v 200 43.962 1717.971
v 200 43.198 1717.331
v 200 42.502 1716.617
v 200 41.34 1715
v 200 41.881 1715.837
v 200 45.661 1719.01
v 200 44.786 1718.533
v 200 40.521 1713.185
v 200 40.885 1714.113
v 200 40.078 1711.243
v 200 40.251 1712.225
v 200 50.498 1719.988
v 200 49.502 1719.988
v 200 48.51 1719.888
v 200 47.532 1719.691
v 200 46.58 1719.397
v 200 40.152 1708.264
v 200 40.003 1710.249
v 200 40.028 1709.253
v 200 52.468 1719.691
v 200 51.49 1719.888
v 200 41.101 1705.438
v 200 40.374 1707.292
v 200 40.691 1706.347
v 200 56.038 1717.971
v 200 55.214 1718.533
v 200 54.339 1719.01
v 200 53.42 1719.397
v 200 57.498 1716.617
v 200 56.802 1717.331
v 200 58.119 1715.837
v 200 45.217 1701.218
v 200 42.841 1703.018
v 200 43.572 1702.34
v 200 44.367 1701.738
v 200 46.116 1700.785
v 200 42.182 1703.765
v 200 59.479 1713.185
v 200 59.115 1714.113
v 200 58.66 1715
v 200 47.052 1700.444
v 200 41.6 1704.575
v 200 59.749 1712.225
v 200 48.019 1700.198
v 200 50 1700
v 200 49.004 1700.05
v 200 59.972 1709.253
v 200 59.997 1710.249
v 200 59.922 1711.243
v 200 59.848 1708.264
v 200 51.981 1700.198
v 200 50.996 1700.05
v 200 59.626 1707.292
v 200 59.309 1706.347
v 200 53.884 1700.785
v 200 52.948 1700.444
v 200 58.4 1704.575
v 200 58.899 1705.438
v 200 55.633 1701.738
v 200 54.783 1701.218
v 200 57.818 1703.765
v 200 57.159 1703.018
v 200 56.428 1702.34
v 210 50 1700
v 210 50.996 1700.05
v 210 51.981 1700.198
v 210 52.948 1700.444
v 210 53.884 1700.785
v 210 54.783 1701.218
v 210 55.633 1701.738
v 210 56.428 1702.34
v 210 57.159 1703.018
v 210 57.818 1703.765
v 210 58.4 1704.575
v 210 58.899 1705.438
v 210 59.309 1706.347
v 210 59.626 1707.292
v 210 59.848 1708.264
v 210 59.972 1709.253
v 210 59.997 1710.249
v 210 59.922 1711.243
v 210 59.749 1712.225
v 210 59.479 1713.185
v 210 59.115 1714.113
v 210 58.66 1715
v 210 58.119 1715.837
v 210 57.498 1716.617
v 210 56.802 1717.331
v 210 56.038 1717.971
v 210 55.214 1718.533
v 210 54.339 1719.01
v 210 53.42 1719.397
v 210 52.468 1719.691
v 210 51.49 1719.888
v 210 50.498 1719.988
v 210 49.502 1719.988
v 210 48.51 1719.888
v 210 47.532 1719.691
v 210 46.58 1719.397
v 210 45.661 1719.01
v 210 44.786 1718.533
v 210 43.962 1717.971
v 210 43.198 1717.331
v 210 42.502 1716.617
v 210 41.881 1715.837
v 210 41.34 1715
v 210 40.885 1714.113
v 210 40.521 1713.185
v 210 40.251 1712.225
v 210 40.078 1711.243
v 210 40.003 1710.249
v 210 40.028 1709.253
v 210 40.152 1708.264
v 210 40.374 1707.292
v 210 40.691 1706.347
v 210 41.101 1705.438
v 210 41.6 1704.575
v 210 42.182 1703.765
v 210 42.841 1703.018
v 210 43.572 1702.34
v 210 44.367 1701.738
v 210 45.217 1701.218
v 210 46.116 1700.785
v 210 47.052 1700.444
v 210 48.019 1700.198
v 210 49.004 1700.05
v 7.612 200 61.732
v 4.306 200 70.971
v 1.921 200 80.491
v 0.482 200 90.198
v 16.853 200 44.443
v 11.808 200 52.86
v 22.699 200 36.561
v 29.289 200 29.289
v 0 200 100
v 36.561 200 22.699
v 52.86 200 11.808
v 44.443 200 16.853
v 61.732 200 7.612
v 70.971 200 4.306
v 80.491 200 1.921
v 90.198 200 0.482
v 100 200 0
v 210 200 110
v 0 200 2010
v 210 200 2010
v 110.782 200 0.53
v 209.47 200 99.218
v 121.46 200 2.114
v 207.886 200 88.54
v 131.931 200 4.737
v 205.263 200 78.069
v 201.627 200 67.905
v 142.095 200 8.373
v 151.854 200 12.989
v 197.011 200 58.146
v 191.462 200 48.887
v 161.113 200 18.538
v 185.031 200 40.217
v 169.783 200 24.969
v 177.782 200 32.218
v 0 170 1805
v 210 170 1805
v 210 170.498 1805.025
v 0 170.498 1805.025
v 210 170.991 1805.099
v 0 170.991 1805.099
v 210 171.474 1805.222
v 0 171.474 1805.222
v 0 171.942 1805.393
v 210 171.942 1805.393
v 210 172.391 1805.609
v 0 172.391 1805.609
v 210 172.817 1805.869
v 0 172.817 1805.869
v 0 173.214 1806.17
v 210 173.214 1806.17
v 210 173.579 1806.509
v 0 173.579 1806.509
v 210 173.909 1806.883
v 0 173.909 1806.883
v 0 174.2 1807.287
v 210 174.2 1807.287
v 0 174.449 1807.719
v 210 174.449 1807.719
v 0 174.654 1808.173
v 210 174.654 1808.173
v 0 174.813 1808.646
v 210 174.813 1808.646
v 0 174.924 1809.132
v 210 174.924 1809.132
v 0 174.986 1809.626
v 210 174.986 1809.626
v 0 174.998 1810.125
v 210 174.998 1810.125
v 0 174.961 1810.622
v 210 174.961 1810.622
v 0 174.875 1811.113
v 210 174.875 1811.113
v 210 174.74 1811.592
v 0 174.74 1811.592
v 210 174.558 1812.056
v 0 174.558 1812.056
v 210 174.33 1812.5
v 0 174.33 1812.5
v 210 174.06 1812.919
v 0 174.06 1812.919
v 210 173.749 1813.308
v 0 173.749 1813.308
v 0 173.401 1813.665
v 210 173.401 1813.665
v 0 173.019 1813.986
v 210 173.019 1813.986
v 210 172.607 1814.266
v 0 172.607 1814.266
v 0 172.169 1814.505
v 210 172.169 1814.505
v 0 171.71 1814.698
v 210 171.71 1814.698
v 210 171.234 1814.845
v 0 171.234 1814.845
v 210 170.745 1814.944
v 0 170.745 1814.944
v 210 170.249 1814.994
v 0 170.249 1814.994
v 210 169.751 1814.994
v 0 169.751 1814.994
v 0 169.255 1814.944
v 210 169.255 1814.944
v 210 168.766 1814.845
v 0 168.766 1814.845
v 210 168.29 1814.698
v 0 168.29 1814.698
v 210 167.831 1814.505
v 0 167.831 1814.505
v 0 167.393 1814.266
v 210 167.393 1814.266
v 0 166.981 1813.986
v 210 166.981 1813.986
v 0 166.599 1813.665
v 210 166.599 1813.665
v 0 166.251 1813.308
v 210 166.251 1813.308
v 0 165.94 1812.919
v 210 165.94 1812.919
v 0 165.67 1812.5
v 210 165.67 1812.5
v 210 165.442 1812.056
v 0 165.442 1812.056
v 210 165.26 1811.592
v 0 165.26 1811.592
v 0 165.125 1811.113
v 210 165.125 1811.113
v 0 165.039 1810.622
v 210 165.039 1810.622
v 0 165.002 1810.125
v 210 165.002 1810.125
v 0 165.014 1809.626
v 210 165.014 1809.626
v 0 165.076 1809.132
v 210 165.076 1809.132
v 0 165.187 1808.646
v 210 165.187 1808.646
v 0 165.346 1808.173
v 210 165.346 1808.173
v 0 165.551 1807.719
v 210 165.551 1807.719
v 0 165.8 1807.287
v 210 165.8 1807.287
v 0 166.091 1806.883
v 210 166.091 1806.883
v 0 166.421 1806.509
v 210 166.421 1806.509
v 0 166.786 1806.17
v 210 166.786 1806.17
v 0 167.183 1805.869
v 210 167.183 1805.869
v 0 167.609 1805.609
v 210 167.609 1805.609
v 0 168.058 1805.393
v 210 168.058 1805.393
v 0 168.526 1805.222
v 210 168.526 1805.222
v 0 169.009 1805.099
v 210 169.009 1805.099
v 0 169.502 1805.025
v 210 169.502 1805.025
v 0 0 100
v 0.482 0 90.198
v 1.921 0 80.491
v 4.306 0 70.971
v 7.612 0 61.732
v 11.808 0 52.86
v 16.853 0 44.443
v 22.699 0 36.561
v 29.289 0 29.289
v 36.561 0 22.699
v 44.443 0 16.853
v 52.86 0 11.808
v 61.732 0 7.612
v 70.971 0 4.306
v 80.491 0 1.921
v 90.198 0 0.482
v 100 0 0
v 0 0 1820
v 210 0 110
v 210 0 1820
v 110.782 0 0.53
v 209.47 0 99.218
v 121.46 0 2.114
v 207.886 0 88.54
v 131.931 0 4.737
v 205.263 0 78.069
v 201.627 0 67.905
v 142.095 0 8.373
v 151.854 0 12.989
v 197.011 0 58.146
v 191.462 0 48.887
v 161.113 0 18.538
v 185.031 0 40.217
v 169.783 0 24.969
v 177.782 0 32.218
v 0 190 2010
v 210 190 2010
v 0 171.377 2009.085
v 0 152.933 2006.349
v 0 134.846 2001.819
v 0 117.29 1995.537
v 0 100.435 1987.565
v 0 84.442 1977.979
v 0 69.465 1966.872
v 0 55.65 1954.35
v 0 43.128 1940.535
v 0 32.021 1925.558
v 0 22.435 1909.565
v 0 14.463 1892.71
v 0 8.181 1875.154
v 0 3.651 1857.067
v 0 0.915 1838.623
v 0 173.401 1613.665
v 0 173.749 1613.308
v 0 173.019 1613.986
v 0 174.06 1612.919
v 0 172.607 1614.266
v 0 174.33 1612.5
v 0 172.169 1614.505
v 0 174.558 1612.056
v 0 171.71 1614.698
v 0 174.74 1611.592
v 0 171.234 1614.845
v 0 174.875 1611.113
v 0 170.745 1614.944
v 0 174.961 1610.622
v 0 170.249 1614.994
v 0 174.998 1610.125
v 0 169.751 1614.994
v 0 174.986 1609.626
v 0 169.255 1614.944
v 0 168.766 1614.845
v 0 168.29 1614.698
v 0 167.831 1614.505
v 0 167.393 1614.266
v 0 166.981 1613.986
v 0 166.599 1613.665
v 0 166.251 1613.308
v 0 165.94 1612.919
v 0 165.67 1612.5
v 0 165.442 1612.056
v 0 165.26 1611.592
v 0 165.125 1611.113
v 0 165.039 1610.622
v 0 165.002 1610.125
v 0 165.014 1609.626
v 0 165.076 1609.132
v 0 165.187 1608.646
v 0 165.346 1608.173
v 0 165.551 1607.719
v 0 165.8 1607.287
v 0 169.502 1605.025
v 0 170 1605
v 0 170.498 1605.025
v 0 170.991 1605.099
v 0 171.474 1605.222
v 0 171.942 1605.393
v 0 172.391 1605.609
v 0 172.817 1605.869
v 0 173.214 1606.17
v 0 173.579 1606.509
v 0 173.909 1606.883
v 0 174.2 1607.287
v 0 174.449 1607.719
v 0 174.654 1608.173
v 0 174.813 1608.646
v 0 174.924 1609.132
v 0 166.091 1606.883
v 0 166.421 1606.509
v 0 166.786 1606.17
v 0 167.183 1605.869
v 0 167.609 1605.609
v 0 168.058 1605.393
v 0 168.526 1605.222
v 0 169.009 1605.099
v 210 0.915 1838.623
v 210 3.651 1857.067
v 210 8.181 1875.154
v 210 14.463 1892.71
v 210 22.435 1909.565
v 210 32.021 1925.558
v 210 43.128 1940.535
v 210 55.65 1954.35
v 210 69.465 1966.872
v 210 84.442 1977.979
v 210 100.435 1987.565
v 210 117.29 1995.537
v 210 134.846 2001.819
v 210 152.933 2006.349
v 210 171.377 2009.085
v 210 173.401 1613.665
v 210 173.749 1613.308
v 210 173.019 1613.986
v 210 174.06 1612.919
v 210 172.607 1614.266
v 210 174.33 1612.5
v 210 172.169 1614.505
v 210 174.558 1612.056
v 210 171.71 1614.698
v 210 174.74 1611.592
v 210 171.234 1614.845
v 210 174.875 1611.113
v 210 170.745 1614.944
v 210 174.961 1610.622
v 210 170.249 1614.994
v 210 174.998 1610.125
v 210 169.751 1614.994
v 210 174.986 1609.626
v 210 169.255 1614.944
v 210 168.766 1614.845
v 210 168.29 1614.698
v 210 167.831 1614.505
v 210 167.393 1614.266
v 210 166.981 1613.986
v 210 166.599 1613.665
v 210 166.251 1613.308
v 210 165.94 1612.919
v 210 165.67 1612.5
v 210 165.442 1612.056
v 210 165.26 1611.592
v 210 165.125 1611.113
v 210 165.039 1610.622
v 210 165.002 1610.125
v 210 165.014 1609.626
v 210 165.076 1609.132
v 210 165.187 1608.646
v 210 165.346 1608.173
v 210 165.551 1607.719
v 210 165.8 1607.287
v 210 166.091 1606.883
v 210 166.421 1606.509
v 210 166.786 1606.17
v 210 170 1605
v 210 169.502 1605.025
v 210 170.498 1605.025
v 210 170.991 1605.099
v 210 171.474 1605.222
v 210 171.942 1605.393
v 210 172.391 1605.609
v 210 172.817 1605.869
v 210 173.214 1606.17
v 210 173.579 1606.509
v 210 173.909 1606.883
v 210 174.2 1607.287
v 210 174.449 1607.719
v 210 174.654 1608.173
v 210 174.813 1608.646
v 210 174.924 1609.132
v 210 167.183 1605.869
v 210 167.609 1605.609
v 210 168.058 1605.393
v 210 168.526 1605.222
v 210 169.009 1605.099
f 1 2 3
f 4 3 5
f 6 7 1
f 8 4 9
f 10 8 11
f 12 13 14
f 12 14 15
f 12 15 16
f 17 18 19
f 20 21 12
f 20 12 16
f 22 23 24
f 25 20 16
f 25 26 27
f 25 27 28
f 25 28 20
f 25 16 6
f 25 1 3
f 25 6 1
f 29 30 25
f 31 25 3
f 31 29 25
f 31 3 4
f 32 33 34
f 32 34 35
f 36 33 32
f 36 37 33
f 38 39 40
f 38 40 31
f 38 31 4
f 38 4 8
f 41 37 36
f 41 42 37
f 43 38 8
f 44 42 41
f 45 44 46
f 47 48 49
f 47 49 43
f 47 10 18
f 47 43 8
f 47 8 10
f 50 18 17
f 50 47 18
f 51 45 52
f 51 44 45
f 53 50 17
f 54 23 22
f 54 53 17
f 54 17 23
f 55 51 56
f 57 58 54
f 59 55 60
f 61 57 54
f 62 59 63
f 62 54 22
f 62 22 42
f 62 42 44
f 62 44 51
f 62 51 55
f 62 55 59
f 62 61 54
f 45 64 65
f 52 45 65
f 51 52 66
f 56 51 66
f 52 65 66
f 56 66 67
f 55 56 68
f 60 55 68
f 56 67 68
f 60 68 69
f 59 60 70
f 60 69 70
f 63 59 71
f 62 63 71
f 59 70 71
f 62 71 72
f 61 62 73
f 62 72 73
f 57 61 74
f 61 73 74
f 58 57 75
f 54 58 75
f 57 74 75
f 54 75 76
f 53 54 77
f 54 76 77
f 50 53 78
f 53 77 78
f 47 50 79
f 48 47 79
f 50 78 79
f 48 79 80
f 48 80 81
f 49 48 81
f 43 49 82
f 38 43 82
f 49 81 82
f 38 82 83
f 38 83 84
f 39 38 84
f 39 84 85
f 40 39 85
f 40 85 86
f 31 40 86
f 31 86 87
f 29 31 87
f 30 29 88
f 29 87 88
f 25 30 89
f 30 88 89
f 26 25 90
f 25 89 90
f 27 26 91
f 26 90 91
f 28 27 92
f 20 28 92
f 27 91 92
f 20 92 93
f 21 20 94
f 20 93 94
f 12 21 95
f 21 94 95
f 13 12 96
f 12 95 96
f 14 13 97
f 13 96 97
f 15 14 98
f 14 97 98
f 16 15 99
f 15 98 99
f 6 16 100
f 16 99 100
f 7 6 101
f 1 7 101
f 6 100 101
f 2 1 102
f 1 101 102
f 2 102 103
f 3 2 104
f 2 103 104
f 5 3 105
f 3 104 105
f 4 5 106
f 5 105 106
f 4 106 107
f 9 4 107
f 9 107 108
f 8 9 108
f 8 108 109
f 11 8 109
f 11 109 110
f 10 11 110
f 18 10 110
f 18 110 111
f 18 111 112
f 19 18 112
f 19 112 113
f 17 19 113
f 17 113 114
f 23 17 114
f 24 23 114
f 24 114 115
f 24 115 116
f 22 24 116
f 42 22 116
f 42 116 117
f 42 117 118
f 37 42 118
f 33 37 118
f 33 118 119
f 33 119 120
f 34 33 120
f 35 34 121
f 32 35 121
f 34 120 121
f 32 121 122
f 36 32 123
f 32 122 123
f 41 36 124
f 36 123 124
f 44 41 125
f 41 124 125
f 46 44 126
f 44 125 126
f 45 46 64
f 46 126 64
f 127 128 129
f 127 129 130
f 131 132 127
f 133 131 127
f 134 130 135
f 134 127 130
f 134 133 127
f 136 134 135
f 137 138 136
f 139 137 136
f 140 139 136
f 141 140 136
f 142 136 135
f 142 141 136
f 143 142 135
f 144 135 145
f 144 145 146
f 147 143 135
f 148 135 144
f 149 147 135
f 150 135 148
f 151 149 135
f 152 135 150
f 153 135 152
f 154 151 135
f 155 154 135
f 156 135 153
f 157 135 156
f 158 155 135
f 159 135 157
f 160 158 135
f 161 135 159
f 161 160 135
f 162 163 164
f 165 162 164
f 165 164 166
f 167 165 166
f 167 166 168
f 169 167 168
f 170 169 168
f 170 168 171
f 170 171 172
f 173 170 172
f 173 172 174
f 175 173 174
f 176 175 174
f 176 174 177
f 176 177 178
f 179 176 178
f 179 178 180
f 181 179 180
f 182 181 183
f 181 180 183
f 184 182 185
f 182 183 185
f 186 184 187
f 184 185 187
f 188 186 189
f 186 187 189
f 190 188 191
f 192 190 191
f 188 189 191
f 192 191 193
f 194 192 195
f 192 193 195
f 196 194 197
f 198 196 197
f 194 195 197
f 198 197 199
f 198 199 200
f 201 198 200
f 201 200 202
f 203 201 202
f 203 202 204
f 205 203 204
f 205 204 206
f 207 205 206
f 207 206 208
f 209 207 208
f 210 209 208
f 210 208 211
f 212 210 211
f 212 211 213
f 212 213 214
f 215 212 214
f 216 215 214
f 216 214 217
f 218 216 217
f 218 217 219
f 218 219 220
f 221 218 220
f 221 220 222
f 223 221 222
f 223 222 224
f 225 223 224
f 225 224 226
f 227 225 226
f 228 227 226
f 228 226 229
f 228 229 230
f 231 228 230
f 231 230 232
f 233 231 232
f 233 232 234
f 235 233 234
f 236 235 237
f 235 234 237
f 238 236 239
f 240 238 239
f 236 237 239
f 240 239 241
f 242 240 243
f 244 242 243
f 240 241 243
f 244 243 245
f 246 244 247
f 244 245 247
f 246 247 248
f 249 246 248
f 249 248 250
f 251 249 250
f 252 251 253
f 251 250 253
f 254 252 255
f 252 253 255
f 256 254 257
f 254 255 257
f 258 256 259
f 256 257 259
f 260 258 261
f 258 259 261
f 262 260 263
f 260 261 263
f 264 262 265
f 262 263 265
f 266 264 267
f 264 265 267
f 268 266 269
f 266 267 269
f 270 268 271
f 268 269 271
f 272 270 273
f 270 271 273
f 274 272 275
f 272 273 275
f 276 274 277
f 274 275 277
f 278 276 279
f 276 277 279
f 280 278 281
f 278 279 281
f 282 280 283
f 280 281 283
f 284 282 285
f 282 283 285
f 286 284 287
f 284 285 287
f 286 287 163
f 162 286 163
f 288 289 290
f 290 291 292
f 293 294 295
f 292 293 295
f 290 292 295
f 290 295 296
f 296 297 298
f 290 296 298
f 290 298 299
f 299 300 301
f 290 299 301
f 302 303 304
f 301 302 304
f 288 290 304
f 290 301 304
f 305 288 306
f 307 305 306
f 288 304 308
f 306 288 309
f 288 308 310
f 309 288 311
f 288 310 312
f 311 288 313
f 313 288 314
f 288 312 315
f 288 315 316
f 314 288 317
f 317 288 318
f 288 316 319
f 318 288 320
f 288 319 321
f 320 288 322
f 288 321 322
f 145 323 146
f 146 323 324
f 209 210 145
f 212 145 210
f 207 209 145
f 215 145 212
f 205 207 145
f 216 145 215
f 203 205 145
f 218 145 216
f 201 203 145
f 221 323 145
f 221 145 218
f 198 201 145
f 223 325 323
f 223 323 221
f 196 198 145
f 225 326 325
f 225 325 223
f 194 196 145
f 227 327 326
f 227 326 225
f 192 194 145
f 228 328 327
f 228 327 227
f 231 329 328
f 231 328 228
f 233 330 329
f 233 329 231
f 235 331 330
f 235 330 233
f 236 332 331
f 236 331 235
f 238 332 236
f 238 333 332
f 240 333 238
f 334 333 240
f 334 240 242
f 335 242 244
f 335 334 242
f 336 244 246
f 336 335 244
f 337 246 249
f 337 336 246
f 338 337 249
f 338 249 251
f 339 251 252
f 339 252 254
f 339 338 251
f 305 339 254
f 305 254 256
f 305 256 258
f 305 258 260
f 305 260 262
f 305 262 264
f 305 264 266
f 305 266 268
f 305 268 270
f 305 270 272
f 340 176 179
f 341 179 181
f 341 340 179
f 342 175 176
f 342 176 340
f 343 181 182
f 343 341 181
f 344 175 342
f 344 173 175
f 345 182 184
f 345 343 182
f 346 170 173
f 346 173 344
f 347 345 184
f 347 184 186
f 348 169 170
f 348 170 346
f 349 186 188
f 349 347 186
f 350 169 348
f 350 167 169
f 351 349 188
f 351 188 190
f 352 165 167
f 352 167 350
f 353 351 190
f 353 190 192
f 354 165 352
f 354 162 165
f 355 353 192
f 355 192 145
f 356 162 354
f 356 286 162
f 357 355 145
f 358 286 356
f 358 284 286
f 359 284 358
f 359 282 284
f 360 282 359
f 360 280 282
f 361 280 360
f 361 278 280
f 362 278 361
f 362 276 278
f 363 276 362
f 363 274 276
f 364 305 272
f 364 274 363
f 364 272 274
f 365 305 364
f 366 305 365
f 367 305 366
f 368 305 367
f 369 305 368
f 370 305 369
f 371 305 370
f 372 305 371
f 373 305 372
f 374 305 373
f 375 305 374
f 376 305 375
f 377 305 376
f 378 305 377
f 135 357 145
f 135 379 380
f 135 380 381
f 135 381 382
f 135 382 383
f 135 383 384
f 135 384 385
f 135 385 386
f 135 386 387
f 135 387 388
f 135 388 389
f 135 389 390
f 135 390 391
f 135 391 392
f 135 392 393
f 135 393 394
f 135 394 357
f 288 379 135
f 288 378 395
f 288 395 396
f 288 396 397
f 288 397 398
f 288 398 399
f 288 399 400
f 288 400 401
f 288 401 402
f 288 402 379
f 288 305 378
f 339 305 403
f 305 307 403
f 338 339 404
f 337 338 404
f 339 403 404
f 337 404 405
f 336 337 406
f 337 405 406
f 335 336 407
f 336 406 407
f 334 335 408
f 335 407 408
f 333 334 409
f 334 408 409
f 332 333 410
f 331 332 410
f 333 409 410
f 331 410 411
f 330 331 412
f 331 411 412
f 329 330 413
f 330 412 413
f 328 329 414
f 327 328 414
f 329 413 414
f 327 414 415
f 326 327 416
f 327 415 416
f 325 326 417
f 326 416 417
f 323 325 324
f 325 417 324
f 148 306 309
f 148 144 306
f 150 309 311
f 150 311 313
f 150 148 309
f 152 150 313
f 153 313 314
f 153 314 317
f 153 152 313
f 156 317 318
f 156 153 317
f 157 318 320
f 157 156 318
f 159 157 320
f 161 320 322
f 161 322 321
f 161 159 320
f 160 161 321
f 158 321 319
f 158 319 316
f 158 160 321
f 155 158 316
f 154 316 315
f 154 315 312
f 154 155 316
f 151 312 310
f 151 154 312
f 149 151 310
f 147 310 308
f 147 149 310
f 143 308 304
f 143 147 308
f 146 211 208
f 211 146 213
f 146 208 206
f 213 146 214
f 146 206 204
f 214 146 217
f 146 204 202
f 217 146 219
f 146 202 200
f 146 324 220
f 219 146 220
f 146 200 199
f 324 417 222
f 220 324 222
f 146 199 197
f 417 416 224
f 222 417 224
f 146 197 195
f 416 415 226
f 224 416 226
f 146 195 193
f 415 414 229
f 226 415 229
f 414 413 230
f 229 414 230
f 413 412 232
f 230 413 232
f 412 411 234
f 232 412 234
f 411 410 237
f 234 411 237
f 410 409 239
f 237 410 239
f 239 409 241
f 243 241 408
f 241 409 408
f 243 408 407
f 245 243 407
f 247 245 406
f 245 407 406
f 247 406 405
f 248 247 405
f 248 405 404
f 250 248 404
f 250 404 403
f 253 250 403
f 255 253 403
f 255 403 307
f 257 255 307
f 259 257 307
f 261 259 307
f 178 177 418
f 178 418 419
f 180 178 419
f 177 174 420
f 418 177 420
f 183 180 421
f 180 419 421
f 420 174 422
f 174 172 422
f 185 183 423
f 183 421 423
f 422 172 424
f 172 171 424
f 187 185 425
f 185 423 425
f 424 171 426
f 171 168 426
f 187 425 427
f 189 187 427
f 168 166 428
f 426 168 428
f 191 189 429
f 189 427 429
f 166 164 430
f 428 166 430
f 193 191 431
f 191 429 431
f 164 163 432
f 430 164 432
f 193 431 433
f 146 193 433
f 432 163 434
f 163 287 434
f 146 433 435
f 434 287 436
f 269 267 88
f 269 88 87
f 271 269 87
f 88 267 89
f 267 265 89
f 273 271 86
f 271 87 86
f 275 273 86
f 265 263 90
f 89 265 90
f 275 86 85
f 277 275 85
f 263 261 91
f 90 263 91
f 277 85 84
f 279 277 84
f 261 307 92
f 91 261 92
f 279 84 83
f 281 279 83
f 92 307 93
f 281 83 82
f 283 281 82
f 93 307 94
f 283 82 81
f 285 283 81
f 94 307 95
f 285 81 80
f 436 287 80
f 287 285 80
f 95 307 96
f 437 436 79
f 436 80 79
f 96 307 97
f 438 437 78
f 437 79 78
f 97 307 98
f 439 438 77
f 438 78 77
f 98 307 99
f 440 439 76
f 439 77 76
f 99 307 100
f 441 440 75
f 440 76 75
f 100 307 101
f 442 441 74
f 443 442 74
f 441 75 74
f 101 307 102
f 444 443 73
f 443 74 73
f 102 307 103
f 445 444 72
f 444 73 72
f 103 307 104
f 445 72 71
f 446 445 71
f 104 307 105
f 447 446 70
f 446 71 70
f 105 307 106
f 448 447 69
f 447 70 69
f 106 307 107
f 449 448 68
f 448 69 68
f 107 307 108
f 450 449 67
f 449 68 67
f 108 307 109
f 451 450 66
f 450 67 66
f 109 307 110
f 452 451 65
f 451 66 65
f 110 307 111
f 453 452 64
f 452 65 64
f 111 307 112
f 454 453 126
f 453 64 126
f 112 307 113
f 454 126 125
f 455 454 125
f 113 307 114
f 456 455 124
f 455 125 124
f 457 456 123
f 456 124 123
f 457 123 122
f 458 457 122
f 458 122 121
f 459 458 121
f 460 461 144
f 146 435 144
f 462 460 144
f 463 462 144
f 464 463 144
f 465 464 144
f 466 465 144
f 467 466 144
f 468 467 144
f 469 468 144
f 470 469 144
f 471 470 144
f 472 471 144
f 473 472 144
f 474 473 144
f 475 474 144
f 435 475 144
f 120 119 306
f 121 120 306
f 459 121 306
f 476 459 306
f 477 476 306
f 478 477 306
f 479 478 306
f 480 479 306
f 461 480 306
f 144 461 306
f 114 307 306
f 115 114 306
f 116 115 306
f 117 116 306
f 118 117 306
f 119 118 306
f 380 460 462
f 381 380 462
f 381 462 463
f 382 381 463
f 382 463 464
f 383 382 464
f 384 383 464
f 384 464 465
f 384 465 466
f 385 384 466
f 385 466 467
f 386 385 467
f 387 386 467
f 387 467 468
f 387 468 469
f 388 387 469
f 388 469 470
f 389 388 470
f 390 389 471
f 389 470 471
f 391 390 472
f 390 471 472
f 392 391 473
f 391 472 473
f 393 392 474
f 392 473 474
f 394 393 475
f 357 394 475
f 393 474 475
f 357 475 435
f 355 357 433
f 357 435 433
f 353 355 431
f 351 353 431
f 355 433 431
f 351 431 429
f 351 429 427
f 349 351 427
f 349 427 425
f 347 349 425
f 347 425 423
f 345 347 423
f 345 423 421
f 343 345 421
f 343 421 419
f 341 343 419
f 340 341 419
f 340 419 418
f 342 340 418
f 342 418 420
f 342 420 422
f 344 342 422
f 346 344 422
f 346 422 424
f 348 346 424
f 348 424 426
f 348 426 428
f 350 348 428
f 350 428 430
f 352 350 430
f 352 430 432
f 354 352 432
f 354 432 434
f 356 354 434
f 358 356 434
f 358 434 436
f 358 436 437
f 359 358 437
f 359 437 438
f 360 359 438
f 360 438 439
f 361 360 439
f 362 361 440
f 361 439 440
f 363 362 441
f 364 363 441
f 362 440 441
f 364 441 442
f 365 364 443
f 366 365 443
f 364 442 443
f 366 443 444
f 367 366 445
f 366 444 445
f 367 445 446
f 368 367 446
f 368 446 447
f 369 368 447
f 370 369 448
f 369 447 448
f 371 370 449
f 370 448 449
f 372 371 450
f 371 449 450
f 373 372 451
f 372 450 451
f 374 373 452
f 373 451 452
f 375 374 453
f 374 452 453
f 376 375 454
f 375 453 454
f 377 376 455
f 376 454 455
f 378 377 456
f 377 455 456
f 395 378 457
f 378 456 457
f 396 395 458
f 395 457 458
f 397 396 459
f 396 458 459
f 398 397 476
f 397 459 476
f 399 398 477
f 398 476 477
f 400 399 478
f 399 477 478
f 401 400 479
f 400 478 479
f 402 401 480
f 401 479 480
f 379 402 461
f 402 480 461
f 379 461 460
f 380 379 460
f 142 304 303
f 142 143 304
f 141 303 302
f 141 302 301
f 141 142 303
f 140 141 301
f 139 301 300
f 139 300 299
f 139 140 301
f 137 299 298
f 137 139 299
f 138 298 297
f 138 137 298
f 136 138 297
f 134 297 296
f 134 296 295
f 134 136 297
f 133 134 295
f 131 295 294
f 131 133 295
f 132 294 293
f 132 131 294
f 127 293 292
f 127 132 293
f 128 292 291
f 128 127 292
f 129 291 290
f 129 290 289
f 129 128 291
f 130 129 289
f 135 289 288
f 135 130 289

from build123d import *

# Parameters (mm, degrees)
SKETCH1_W           = 210
SKETCH1_H           = 2010
BOSS_EXTRUDE1_DEPTH = 200
FILLET1_R           = 110
FILLET2_R           = 100
FILLET3_R           = 190
SKETCH3_R           = 10
CUT_EXTRUDE1_DEPTH  = 10
SKETCH4_R           = 5
CUT_EXTRUDE2_DEPTH  = 2031.812645224


with BuildPart() as part:
    # Sketch1 → Boss-Extrude1 (new body)
    with BuildSketch(Plane(origin=(0, 0, 0), x_dir=(1, 0, 0), z_dir=(0, 1, 0))):
        with Locations((105, -1005)):
            Rectangle(SKETCH1_W, SKETCH1_H)
    extrude(amount=BOSS_EXTRUDE1_DEPTH)

    # Fillet1
    fillet1_edges = [part.edges().sort_by_distance(p)[0] for p in [
        (210, 100, 0),
    ]]
    fillet(fillet1_edges, radius=FILLET1_R)

    # Fillet2
    fillet2_edges = [part.edges().sort_by_distance(p)[0] for p in [
        (0, 100, 0),
    ]]
    fillet(fillet2_edges, radius=FILLET2_R - 0.0001)  # a hair under: the kernel refuses the full size

    # Fillet3
    fillet3_edges = [part.edges().sort_by_distance(p)[0] for p in [
        (105, 0, 2010),
    ]]
    fillet(fillet3_edges, radius=FILLET3_R)

    # Sketch3 → Cut-Extrude1 (cut)
    with BuildSketch(Plane(origin=(210, 0, 0), x_dir=(0, 0, -1), z_dir=(1, 0, 0))):
        with Locations((-1710, 50)):
            Circle(SKETCH3_R)
    extrude(amount=-CUT_EXTRUDE1_DEPTH, mode=Mode.SUBTRACT)

    # Sketch4 → Cut-Extrude2 (cut, through all)
    with BuildSketch(Plane(origin=(210, 0, 0), x_dir=(0, 0, -1), z_dir=(1, 0, 0))):
        with Locations((-1810, 170)):
            Circle(SKETCH4_R)
        with Locations((-1610, 170)):
            Circle(SKETCH4_R)
    extrude(amount=-CUT_EXTRUDE2_DEPTH, mode=Mode.SUBTRACT)


solid = part.part
